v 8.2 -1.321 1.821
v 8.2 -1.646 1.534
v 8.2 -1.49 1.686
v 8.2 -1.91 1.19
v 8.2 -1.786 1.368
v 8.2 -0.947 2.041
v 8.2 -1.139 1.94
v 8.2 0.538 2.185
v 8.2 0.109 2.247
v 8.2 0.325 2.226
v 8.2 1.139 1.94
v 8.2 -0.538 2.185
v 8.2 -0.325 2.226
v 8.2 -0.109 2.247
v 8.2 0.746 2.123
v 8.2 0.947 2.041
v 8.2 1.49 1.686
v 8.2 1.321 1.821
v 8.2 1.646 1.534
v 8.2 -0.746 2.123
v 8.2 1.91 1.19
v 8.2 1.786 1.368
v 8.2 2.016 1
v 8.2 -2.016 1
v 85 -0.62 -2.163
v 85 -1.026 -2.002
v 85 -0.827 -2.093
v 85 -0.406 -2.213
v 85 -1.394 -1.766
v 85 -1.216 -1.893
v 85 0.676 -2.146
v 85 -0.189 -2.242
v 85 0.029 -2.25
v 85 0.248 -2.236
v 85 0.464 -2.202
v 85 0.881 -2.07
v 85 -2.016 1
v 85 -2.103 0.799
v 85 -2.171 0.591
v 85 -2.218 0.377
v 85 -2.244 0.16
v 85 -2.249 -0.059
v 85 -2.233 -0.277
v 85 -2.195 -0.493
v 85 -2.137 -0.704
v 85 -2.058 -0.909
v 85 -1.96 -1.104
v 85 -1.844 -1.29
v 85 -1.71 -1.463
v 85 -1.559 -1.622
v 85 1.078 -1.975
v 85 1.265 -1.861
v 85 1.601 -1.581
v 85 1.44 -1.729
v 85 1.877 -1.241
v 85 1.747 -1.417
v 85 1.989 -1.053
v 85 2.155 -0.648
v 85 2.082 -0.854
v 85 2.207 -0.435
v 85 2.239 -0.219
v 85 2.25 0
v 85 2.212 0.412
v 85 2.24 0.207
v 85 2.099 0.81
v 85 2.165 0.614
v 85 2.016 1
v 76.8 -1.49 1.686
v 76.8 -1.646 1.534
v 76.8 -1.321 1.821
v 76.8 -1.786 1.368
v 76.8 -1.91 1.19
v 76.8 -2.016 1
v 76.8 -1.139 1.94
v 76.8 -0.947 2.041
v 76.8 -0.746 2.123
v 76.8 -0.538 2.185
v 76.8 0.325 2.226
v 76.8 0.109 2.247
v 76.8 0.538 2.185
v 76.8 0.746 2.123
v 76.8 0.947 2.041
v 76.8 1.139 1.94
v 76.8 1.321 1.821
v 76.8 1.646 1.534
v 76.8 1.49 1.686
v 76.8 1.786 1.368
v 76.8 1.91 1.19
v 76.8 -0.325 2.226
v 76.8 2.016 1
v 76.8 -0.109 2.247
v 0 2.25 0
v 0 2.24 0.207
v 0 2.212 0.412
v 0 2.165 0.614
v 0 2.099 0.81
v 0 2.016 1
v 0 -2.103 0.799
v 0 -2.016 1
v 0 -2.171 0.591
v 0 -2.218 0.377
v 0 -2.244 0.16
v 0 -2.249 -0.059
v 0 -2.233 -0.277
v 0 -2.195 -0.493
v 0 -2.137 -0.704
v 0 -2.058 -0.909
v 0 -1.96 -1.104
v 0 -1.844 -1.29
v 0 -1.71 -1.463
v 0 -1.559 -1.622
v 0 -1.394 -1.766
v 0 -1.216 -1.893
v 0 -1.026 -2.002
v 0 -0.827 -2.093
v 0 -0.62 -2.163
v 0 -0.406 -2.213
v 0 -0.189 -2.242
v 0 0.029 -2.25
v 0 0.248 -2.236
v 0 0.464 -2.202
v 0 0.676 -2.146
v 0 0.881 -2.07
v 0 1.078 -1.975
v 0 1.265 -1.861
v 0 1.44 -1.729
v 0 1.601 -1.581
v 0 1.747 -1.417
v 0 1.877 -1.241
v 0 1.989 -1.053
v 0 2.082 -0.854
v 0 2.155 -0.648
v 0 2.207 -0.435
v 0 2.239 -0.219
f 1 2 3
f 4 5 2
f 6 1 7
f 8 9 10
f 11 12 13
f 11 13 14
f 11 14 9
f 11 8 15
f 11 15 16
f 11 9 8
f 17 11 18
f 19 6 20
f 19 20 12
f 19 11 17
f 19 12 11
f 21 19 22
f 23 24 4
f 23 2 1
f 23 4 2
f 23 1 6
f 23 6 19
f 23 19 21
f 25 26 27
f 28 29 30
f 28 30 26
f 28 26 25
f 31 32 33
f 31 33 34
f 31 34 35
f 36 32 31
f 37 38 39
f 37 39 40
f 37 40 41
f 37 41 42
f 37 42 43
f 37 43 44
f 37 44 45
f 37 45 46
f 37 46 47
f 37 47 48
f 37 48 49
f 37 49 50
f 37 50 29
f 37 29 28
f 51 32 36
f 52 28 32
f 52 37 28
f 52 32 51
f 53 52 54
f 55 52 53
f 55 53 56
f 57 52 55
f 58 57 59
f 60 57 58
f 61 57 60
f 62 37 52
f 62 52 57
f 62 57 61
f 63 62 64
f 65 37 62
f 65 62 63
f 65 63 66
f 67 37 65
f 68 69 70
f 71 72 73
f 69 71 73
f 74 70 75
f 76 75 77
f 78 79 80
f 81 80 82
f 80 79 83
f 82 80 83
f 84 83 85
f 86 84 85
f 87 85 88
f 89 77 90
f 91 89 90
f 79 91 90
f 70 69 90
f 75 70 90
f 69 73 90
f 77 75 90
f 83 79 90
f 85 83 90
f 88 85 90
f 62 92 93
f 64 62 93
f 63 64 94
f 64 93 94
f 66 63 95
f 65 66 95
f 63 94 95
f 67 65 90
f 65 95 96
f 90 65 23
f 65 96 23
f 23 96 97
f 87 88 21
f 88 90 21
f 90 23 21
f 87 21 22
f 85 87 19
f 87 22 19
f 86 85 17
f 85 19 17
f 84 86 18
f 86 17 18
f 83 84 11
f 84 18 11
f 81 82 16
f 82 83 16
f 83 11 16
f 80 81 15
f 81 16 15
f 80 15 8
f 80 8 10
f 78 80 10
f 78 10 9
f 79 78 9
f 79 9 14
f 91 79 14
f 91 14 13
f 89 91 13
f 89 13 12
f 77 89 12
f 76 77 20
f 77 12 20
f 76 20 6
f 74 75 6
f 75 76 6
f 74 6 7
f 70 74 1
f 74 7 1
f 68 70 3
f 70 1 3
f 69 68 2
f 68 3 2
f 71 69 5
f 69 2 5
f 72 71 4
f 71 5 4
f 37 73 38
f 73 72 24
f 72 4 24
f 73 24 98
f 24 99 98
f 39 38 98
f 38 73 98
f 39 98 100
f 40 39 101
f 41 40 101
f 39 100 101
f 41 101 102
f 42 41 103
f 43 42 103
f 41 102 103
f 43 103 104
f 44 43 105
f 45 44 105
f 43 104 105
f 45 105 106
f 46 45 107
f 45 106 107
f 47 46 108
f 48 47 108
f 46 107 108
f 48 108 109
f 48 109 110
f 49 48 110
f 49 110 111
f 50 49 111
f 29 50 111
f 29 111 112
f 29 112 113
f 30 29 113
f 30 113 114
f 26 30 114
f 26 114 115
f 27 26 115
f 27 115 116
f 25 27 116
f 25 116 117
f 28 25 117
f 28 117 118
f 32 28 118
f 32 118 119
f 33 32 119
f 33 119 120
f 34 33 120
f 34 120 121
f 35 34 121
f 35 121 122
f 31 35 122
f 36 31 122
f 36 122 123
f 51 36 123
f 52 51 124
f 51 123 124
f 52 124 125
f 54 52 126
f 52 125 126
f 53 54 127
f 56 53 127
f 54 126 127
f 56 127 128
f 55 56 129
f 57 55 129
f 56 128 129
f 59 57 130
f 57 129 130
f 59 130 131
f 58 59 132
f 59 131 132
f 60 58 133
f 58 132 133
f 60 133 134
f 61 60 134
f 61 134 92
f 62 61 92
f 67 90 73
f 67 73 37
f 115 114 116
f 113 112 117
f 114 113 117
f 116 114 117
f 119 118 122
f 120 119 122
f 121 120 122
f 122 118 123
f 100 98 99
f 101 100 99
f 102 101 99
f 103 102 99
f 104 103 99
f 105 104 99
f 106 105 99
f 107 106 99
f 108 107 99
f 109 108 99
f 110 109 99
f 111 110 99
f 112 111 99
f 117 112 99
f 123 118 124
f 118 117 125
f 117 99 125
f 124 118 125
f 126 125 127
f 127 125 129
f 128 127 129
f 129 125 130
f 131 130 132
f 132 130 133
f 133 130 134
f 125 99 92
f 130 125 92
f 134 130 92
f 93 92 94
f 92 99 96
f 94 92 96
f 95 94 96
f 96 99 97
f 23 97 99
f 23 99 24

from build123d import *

# Parameters (mm, degrees)
F0_R     = 2.25
F1_DEPTH = 85
F3_W     = 8.2
F3_H     = 17.972744
F3_H_2   = 20.743802
F4_DEPTH = 25


with BuildPart() as f1:
    # F0 (on Right) → F1 (new body)
    with BuildSketch(Plane.YZ):
        Circle(F0_R)
    extrude(amount=F1_DEPTH)

    # F3 (on offset) → F4 (cut)
    with BuildSketch(Plane.XY.offset(1)):
        with Locations((4.1, -0.105816)):
            Rectangle(F3_W, F3_H)
        with Locations((80.9, -0.062075)):
            Rectangle(F3_W, F3_H_2)
    extrude(amount=F4_DEPTH, mode=Mode.SUBTRACT)


solid = f1.part
